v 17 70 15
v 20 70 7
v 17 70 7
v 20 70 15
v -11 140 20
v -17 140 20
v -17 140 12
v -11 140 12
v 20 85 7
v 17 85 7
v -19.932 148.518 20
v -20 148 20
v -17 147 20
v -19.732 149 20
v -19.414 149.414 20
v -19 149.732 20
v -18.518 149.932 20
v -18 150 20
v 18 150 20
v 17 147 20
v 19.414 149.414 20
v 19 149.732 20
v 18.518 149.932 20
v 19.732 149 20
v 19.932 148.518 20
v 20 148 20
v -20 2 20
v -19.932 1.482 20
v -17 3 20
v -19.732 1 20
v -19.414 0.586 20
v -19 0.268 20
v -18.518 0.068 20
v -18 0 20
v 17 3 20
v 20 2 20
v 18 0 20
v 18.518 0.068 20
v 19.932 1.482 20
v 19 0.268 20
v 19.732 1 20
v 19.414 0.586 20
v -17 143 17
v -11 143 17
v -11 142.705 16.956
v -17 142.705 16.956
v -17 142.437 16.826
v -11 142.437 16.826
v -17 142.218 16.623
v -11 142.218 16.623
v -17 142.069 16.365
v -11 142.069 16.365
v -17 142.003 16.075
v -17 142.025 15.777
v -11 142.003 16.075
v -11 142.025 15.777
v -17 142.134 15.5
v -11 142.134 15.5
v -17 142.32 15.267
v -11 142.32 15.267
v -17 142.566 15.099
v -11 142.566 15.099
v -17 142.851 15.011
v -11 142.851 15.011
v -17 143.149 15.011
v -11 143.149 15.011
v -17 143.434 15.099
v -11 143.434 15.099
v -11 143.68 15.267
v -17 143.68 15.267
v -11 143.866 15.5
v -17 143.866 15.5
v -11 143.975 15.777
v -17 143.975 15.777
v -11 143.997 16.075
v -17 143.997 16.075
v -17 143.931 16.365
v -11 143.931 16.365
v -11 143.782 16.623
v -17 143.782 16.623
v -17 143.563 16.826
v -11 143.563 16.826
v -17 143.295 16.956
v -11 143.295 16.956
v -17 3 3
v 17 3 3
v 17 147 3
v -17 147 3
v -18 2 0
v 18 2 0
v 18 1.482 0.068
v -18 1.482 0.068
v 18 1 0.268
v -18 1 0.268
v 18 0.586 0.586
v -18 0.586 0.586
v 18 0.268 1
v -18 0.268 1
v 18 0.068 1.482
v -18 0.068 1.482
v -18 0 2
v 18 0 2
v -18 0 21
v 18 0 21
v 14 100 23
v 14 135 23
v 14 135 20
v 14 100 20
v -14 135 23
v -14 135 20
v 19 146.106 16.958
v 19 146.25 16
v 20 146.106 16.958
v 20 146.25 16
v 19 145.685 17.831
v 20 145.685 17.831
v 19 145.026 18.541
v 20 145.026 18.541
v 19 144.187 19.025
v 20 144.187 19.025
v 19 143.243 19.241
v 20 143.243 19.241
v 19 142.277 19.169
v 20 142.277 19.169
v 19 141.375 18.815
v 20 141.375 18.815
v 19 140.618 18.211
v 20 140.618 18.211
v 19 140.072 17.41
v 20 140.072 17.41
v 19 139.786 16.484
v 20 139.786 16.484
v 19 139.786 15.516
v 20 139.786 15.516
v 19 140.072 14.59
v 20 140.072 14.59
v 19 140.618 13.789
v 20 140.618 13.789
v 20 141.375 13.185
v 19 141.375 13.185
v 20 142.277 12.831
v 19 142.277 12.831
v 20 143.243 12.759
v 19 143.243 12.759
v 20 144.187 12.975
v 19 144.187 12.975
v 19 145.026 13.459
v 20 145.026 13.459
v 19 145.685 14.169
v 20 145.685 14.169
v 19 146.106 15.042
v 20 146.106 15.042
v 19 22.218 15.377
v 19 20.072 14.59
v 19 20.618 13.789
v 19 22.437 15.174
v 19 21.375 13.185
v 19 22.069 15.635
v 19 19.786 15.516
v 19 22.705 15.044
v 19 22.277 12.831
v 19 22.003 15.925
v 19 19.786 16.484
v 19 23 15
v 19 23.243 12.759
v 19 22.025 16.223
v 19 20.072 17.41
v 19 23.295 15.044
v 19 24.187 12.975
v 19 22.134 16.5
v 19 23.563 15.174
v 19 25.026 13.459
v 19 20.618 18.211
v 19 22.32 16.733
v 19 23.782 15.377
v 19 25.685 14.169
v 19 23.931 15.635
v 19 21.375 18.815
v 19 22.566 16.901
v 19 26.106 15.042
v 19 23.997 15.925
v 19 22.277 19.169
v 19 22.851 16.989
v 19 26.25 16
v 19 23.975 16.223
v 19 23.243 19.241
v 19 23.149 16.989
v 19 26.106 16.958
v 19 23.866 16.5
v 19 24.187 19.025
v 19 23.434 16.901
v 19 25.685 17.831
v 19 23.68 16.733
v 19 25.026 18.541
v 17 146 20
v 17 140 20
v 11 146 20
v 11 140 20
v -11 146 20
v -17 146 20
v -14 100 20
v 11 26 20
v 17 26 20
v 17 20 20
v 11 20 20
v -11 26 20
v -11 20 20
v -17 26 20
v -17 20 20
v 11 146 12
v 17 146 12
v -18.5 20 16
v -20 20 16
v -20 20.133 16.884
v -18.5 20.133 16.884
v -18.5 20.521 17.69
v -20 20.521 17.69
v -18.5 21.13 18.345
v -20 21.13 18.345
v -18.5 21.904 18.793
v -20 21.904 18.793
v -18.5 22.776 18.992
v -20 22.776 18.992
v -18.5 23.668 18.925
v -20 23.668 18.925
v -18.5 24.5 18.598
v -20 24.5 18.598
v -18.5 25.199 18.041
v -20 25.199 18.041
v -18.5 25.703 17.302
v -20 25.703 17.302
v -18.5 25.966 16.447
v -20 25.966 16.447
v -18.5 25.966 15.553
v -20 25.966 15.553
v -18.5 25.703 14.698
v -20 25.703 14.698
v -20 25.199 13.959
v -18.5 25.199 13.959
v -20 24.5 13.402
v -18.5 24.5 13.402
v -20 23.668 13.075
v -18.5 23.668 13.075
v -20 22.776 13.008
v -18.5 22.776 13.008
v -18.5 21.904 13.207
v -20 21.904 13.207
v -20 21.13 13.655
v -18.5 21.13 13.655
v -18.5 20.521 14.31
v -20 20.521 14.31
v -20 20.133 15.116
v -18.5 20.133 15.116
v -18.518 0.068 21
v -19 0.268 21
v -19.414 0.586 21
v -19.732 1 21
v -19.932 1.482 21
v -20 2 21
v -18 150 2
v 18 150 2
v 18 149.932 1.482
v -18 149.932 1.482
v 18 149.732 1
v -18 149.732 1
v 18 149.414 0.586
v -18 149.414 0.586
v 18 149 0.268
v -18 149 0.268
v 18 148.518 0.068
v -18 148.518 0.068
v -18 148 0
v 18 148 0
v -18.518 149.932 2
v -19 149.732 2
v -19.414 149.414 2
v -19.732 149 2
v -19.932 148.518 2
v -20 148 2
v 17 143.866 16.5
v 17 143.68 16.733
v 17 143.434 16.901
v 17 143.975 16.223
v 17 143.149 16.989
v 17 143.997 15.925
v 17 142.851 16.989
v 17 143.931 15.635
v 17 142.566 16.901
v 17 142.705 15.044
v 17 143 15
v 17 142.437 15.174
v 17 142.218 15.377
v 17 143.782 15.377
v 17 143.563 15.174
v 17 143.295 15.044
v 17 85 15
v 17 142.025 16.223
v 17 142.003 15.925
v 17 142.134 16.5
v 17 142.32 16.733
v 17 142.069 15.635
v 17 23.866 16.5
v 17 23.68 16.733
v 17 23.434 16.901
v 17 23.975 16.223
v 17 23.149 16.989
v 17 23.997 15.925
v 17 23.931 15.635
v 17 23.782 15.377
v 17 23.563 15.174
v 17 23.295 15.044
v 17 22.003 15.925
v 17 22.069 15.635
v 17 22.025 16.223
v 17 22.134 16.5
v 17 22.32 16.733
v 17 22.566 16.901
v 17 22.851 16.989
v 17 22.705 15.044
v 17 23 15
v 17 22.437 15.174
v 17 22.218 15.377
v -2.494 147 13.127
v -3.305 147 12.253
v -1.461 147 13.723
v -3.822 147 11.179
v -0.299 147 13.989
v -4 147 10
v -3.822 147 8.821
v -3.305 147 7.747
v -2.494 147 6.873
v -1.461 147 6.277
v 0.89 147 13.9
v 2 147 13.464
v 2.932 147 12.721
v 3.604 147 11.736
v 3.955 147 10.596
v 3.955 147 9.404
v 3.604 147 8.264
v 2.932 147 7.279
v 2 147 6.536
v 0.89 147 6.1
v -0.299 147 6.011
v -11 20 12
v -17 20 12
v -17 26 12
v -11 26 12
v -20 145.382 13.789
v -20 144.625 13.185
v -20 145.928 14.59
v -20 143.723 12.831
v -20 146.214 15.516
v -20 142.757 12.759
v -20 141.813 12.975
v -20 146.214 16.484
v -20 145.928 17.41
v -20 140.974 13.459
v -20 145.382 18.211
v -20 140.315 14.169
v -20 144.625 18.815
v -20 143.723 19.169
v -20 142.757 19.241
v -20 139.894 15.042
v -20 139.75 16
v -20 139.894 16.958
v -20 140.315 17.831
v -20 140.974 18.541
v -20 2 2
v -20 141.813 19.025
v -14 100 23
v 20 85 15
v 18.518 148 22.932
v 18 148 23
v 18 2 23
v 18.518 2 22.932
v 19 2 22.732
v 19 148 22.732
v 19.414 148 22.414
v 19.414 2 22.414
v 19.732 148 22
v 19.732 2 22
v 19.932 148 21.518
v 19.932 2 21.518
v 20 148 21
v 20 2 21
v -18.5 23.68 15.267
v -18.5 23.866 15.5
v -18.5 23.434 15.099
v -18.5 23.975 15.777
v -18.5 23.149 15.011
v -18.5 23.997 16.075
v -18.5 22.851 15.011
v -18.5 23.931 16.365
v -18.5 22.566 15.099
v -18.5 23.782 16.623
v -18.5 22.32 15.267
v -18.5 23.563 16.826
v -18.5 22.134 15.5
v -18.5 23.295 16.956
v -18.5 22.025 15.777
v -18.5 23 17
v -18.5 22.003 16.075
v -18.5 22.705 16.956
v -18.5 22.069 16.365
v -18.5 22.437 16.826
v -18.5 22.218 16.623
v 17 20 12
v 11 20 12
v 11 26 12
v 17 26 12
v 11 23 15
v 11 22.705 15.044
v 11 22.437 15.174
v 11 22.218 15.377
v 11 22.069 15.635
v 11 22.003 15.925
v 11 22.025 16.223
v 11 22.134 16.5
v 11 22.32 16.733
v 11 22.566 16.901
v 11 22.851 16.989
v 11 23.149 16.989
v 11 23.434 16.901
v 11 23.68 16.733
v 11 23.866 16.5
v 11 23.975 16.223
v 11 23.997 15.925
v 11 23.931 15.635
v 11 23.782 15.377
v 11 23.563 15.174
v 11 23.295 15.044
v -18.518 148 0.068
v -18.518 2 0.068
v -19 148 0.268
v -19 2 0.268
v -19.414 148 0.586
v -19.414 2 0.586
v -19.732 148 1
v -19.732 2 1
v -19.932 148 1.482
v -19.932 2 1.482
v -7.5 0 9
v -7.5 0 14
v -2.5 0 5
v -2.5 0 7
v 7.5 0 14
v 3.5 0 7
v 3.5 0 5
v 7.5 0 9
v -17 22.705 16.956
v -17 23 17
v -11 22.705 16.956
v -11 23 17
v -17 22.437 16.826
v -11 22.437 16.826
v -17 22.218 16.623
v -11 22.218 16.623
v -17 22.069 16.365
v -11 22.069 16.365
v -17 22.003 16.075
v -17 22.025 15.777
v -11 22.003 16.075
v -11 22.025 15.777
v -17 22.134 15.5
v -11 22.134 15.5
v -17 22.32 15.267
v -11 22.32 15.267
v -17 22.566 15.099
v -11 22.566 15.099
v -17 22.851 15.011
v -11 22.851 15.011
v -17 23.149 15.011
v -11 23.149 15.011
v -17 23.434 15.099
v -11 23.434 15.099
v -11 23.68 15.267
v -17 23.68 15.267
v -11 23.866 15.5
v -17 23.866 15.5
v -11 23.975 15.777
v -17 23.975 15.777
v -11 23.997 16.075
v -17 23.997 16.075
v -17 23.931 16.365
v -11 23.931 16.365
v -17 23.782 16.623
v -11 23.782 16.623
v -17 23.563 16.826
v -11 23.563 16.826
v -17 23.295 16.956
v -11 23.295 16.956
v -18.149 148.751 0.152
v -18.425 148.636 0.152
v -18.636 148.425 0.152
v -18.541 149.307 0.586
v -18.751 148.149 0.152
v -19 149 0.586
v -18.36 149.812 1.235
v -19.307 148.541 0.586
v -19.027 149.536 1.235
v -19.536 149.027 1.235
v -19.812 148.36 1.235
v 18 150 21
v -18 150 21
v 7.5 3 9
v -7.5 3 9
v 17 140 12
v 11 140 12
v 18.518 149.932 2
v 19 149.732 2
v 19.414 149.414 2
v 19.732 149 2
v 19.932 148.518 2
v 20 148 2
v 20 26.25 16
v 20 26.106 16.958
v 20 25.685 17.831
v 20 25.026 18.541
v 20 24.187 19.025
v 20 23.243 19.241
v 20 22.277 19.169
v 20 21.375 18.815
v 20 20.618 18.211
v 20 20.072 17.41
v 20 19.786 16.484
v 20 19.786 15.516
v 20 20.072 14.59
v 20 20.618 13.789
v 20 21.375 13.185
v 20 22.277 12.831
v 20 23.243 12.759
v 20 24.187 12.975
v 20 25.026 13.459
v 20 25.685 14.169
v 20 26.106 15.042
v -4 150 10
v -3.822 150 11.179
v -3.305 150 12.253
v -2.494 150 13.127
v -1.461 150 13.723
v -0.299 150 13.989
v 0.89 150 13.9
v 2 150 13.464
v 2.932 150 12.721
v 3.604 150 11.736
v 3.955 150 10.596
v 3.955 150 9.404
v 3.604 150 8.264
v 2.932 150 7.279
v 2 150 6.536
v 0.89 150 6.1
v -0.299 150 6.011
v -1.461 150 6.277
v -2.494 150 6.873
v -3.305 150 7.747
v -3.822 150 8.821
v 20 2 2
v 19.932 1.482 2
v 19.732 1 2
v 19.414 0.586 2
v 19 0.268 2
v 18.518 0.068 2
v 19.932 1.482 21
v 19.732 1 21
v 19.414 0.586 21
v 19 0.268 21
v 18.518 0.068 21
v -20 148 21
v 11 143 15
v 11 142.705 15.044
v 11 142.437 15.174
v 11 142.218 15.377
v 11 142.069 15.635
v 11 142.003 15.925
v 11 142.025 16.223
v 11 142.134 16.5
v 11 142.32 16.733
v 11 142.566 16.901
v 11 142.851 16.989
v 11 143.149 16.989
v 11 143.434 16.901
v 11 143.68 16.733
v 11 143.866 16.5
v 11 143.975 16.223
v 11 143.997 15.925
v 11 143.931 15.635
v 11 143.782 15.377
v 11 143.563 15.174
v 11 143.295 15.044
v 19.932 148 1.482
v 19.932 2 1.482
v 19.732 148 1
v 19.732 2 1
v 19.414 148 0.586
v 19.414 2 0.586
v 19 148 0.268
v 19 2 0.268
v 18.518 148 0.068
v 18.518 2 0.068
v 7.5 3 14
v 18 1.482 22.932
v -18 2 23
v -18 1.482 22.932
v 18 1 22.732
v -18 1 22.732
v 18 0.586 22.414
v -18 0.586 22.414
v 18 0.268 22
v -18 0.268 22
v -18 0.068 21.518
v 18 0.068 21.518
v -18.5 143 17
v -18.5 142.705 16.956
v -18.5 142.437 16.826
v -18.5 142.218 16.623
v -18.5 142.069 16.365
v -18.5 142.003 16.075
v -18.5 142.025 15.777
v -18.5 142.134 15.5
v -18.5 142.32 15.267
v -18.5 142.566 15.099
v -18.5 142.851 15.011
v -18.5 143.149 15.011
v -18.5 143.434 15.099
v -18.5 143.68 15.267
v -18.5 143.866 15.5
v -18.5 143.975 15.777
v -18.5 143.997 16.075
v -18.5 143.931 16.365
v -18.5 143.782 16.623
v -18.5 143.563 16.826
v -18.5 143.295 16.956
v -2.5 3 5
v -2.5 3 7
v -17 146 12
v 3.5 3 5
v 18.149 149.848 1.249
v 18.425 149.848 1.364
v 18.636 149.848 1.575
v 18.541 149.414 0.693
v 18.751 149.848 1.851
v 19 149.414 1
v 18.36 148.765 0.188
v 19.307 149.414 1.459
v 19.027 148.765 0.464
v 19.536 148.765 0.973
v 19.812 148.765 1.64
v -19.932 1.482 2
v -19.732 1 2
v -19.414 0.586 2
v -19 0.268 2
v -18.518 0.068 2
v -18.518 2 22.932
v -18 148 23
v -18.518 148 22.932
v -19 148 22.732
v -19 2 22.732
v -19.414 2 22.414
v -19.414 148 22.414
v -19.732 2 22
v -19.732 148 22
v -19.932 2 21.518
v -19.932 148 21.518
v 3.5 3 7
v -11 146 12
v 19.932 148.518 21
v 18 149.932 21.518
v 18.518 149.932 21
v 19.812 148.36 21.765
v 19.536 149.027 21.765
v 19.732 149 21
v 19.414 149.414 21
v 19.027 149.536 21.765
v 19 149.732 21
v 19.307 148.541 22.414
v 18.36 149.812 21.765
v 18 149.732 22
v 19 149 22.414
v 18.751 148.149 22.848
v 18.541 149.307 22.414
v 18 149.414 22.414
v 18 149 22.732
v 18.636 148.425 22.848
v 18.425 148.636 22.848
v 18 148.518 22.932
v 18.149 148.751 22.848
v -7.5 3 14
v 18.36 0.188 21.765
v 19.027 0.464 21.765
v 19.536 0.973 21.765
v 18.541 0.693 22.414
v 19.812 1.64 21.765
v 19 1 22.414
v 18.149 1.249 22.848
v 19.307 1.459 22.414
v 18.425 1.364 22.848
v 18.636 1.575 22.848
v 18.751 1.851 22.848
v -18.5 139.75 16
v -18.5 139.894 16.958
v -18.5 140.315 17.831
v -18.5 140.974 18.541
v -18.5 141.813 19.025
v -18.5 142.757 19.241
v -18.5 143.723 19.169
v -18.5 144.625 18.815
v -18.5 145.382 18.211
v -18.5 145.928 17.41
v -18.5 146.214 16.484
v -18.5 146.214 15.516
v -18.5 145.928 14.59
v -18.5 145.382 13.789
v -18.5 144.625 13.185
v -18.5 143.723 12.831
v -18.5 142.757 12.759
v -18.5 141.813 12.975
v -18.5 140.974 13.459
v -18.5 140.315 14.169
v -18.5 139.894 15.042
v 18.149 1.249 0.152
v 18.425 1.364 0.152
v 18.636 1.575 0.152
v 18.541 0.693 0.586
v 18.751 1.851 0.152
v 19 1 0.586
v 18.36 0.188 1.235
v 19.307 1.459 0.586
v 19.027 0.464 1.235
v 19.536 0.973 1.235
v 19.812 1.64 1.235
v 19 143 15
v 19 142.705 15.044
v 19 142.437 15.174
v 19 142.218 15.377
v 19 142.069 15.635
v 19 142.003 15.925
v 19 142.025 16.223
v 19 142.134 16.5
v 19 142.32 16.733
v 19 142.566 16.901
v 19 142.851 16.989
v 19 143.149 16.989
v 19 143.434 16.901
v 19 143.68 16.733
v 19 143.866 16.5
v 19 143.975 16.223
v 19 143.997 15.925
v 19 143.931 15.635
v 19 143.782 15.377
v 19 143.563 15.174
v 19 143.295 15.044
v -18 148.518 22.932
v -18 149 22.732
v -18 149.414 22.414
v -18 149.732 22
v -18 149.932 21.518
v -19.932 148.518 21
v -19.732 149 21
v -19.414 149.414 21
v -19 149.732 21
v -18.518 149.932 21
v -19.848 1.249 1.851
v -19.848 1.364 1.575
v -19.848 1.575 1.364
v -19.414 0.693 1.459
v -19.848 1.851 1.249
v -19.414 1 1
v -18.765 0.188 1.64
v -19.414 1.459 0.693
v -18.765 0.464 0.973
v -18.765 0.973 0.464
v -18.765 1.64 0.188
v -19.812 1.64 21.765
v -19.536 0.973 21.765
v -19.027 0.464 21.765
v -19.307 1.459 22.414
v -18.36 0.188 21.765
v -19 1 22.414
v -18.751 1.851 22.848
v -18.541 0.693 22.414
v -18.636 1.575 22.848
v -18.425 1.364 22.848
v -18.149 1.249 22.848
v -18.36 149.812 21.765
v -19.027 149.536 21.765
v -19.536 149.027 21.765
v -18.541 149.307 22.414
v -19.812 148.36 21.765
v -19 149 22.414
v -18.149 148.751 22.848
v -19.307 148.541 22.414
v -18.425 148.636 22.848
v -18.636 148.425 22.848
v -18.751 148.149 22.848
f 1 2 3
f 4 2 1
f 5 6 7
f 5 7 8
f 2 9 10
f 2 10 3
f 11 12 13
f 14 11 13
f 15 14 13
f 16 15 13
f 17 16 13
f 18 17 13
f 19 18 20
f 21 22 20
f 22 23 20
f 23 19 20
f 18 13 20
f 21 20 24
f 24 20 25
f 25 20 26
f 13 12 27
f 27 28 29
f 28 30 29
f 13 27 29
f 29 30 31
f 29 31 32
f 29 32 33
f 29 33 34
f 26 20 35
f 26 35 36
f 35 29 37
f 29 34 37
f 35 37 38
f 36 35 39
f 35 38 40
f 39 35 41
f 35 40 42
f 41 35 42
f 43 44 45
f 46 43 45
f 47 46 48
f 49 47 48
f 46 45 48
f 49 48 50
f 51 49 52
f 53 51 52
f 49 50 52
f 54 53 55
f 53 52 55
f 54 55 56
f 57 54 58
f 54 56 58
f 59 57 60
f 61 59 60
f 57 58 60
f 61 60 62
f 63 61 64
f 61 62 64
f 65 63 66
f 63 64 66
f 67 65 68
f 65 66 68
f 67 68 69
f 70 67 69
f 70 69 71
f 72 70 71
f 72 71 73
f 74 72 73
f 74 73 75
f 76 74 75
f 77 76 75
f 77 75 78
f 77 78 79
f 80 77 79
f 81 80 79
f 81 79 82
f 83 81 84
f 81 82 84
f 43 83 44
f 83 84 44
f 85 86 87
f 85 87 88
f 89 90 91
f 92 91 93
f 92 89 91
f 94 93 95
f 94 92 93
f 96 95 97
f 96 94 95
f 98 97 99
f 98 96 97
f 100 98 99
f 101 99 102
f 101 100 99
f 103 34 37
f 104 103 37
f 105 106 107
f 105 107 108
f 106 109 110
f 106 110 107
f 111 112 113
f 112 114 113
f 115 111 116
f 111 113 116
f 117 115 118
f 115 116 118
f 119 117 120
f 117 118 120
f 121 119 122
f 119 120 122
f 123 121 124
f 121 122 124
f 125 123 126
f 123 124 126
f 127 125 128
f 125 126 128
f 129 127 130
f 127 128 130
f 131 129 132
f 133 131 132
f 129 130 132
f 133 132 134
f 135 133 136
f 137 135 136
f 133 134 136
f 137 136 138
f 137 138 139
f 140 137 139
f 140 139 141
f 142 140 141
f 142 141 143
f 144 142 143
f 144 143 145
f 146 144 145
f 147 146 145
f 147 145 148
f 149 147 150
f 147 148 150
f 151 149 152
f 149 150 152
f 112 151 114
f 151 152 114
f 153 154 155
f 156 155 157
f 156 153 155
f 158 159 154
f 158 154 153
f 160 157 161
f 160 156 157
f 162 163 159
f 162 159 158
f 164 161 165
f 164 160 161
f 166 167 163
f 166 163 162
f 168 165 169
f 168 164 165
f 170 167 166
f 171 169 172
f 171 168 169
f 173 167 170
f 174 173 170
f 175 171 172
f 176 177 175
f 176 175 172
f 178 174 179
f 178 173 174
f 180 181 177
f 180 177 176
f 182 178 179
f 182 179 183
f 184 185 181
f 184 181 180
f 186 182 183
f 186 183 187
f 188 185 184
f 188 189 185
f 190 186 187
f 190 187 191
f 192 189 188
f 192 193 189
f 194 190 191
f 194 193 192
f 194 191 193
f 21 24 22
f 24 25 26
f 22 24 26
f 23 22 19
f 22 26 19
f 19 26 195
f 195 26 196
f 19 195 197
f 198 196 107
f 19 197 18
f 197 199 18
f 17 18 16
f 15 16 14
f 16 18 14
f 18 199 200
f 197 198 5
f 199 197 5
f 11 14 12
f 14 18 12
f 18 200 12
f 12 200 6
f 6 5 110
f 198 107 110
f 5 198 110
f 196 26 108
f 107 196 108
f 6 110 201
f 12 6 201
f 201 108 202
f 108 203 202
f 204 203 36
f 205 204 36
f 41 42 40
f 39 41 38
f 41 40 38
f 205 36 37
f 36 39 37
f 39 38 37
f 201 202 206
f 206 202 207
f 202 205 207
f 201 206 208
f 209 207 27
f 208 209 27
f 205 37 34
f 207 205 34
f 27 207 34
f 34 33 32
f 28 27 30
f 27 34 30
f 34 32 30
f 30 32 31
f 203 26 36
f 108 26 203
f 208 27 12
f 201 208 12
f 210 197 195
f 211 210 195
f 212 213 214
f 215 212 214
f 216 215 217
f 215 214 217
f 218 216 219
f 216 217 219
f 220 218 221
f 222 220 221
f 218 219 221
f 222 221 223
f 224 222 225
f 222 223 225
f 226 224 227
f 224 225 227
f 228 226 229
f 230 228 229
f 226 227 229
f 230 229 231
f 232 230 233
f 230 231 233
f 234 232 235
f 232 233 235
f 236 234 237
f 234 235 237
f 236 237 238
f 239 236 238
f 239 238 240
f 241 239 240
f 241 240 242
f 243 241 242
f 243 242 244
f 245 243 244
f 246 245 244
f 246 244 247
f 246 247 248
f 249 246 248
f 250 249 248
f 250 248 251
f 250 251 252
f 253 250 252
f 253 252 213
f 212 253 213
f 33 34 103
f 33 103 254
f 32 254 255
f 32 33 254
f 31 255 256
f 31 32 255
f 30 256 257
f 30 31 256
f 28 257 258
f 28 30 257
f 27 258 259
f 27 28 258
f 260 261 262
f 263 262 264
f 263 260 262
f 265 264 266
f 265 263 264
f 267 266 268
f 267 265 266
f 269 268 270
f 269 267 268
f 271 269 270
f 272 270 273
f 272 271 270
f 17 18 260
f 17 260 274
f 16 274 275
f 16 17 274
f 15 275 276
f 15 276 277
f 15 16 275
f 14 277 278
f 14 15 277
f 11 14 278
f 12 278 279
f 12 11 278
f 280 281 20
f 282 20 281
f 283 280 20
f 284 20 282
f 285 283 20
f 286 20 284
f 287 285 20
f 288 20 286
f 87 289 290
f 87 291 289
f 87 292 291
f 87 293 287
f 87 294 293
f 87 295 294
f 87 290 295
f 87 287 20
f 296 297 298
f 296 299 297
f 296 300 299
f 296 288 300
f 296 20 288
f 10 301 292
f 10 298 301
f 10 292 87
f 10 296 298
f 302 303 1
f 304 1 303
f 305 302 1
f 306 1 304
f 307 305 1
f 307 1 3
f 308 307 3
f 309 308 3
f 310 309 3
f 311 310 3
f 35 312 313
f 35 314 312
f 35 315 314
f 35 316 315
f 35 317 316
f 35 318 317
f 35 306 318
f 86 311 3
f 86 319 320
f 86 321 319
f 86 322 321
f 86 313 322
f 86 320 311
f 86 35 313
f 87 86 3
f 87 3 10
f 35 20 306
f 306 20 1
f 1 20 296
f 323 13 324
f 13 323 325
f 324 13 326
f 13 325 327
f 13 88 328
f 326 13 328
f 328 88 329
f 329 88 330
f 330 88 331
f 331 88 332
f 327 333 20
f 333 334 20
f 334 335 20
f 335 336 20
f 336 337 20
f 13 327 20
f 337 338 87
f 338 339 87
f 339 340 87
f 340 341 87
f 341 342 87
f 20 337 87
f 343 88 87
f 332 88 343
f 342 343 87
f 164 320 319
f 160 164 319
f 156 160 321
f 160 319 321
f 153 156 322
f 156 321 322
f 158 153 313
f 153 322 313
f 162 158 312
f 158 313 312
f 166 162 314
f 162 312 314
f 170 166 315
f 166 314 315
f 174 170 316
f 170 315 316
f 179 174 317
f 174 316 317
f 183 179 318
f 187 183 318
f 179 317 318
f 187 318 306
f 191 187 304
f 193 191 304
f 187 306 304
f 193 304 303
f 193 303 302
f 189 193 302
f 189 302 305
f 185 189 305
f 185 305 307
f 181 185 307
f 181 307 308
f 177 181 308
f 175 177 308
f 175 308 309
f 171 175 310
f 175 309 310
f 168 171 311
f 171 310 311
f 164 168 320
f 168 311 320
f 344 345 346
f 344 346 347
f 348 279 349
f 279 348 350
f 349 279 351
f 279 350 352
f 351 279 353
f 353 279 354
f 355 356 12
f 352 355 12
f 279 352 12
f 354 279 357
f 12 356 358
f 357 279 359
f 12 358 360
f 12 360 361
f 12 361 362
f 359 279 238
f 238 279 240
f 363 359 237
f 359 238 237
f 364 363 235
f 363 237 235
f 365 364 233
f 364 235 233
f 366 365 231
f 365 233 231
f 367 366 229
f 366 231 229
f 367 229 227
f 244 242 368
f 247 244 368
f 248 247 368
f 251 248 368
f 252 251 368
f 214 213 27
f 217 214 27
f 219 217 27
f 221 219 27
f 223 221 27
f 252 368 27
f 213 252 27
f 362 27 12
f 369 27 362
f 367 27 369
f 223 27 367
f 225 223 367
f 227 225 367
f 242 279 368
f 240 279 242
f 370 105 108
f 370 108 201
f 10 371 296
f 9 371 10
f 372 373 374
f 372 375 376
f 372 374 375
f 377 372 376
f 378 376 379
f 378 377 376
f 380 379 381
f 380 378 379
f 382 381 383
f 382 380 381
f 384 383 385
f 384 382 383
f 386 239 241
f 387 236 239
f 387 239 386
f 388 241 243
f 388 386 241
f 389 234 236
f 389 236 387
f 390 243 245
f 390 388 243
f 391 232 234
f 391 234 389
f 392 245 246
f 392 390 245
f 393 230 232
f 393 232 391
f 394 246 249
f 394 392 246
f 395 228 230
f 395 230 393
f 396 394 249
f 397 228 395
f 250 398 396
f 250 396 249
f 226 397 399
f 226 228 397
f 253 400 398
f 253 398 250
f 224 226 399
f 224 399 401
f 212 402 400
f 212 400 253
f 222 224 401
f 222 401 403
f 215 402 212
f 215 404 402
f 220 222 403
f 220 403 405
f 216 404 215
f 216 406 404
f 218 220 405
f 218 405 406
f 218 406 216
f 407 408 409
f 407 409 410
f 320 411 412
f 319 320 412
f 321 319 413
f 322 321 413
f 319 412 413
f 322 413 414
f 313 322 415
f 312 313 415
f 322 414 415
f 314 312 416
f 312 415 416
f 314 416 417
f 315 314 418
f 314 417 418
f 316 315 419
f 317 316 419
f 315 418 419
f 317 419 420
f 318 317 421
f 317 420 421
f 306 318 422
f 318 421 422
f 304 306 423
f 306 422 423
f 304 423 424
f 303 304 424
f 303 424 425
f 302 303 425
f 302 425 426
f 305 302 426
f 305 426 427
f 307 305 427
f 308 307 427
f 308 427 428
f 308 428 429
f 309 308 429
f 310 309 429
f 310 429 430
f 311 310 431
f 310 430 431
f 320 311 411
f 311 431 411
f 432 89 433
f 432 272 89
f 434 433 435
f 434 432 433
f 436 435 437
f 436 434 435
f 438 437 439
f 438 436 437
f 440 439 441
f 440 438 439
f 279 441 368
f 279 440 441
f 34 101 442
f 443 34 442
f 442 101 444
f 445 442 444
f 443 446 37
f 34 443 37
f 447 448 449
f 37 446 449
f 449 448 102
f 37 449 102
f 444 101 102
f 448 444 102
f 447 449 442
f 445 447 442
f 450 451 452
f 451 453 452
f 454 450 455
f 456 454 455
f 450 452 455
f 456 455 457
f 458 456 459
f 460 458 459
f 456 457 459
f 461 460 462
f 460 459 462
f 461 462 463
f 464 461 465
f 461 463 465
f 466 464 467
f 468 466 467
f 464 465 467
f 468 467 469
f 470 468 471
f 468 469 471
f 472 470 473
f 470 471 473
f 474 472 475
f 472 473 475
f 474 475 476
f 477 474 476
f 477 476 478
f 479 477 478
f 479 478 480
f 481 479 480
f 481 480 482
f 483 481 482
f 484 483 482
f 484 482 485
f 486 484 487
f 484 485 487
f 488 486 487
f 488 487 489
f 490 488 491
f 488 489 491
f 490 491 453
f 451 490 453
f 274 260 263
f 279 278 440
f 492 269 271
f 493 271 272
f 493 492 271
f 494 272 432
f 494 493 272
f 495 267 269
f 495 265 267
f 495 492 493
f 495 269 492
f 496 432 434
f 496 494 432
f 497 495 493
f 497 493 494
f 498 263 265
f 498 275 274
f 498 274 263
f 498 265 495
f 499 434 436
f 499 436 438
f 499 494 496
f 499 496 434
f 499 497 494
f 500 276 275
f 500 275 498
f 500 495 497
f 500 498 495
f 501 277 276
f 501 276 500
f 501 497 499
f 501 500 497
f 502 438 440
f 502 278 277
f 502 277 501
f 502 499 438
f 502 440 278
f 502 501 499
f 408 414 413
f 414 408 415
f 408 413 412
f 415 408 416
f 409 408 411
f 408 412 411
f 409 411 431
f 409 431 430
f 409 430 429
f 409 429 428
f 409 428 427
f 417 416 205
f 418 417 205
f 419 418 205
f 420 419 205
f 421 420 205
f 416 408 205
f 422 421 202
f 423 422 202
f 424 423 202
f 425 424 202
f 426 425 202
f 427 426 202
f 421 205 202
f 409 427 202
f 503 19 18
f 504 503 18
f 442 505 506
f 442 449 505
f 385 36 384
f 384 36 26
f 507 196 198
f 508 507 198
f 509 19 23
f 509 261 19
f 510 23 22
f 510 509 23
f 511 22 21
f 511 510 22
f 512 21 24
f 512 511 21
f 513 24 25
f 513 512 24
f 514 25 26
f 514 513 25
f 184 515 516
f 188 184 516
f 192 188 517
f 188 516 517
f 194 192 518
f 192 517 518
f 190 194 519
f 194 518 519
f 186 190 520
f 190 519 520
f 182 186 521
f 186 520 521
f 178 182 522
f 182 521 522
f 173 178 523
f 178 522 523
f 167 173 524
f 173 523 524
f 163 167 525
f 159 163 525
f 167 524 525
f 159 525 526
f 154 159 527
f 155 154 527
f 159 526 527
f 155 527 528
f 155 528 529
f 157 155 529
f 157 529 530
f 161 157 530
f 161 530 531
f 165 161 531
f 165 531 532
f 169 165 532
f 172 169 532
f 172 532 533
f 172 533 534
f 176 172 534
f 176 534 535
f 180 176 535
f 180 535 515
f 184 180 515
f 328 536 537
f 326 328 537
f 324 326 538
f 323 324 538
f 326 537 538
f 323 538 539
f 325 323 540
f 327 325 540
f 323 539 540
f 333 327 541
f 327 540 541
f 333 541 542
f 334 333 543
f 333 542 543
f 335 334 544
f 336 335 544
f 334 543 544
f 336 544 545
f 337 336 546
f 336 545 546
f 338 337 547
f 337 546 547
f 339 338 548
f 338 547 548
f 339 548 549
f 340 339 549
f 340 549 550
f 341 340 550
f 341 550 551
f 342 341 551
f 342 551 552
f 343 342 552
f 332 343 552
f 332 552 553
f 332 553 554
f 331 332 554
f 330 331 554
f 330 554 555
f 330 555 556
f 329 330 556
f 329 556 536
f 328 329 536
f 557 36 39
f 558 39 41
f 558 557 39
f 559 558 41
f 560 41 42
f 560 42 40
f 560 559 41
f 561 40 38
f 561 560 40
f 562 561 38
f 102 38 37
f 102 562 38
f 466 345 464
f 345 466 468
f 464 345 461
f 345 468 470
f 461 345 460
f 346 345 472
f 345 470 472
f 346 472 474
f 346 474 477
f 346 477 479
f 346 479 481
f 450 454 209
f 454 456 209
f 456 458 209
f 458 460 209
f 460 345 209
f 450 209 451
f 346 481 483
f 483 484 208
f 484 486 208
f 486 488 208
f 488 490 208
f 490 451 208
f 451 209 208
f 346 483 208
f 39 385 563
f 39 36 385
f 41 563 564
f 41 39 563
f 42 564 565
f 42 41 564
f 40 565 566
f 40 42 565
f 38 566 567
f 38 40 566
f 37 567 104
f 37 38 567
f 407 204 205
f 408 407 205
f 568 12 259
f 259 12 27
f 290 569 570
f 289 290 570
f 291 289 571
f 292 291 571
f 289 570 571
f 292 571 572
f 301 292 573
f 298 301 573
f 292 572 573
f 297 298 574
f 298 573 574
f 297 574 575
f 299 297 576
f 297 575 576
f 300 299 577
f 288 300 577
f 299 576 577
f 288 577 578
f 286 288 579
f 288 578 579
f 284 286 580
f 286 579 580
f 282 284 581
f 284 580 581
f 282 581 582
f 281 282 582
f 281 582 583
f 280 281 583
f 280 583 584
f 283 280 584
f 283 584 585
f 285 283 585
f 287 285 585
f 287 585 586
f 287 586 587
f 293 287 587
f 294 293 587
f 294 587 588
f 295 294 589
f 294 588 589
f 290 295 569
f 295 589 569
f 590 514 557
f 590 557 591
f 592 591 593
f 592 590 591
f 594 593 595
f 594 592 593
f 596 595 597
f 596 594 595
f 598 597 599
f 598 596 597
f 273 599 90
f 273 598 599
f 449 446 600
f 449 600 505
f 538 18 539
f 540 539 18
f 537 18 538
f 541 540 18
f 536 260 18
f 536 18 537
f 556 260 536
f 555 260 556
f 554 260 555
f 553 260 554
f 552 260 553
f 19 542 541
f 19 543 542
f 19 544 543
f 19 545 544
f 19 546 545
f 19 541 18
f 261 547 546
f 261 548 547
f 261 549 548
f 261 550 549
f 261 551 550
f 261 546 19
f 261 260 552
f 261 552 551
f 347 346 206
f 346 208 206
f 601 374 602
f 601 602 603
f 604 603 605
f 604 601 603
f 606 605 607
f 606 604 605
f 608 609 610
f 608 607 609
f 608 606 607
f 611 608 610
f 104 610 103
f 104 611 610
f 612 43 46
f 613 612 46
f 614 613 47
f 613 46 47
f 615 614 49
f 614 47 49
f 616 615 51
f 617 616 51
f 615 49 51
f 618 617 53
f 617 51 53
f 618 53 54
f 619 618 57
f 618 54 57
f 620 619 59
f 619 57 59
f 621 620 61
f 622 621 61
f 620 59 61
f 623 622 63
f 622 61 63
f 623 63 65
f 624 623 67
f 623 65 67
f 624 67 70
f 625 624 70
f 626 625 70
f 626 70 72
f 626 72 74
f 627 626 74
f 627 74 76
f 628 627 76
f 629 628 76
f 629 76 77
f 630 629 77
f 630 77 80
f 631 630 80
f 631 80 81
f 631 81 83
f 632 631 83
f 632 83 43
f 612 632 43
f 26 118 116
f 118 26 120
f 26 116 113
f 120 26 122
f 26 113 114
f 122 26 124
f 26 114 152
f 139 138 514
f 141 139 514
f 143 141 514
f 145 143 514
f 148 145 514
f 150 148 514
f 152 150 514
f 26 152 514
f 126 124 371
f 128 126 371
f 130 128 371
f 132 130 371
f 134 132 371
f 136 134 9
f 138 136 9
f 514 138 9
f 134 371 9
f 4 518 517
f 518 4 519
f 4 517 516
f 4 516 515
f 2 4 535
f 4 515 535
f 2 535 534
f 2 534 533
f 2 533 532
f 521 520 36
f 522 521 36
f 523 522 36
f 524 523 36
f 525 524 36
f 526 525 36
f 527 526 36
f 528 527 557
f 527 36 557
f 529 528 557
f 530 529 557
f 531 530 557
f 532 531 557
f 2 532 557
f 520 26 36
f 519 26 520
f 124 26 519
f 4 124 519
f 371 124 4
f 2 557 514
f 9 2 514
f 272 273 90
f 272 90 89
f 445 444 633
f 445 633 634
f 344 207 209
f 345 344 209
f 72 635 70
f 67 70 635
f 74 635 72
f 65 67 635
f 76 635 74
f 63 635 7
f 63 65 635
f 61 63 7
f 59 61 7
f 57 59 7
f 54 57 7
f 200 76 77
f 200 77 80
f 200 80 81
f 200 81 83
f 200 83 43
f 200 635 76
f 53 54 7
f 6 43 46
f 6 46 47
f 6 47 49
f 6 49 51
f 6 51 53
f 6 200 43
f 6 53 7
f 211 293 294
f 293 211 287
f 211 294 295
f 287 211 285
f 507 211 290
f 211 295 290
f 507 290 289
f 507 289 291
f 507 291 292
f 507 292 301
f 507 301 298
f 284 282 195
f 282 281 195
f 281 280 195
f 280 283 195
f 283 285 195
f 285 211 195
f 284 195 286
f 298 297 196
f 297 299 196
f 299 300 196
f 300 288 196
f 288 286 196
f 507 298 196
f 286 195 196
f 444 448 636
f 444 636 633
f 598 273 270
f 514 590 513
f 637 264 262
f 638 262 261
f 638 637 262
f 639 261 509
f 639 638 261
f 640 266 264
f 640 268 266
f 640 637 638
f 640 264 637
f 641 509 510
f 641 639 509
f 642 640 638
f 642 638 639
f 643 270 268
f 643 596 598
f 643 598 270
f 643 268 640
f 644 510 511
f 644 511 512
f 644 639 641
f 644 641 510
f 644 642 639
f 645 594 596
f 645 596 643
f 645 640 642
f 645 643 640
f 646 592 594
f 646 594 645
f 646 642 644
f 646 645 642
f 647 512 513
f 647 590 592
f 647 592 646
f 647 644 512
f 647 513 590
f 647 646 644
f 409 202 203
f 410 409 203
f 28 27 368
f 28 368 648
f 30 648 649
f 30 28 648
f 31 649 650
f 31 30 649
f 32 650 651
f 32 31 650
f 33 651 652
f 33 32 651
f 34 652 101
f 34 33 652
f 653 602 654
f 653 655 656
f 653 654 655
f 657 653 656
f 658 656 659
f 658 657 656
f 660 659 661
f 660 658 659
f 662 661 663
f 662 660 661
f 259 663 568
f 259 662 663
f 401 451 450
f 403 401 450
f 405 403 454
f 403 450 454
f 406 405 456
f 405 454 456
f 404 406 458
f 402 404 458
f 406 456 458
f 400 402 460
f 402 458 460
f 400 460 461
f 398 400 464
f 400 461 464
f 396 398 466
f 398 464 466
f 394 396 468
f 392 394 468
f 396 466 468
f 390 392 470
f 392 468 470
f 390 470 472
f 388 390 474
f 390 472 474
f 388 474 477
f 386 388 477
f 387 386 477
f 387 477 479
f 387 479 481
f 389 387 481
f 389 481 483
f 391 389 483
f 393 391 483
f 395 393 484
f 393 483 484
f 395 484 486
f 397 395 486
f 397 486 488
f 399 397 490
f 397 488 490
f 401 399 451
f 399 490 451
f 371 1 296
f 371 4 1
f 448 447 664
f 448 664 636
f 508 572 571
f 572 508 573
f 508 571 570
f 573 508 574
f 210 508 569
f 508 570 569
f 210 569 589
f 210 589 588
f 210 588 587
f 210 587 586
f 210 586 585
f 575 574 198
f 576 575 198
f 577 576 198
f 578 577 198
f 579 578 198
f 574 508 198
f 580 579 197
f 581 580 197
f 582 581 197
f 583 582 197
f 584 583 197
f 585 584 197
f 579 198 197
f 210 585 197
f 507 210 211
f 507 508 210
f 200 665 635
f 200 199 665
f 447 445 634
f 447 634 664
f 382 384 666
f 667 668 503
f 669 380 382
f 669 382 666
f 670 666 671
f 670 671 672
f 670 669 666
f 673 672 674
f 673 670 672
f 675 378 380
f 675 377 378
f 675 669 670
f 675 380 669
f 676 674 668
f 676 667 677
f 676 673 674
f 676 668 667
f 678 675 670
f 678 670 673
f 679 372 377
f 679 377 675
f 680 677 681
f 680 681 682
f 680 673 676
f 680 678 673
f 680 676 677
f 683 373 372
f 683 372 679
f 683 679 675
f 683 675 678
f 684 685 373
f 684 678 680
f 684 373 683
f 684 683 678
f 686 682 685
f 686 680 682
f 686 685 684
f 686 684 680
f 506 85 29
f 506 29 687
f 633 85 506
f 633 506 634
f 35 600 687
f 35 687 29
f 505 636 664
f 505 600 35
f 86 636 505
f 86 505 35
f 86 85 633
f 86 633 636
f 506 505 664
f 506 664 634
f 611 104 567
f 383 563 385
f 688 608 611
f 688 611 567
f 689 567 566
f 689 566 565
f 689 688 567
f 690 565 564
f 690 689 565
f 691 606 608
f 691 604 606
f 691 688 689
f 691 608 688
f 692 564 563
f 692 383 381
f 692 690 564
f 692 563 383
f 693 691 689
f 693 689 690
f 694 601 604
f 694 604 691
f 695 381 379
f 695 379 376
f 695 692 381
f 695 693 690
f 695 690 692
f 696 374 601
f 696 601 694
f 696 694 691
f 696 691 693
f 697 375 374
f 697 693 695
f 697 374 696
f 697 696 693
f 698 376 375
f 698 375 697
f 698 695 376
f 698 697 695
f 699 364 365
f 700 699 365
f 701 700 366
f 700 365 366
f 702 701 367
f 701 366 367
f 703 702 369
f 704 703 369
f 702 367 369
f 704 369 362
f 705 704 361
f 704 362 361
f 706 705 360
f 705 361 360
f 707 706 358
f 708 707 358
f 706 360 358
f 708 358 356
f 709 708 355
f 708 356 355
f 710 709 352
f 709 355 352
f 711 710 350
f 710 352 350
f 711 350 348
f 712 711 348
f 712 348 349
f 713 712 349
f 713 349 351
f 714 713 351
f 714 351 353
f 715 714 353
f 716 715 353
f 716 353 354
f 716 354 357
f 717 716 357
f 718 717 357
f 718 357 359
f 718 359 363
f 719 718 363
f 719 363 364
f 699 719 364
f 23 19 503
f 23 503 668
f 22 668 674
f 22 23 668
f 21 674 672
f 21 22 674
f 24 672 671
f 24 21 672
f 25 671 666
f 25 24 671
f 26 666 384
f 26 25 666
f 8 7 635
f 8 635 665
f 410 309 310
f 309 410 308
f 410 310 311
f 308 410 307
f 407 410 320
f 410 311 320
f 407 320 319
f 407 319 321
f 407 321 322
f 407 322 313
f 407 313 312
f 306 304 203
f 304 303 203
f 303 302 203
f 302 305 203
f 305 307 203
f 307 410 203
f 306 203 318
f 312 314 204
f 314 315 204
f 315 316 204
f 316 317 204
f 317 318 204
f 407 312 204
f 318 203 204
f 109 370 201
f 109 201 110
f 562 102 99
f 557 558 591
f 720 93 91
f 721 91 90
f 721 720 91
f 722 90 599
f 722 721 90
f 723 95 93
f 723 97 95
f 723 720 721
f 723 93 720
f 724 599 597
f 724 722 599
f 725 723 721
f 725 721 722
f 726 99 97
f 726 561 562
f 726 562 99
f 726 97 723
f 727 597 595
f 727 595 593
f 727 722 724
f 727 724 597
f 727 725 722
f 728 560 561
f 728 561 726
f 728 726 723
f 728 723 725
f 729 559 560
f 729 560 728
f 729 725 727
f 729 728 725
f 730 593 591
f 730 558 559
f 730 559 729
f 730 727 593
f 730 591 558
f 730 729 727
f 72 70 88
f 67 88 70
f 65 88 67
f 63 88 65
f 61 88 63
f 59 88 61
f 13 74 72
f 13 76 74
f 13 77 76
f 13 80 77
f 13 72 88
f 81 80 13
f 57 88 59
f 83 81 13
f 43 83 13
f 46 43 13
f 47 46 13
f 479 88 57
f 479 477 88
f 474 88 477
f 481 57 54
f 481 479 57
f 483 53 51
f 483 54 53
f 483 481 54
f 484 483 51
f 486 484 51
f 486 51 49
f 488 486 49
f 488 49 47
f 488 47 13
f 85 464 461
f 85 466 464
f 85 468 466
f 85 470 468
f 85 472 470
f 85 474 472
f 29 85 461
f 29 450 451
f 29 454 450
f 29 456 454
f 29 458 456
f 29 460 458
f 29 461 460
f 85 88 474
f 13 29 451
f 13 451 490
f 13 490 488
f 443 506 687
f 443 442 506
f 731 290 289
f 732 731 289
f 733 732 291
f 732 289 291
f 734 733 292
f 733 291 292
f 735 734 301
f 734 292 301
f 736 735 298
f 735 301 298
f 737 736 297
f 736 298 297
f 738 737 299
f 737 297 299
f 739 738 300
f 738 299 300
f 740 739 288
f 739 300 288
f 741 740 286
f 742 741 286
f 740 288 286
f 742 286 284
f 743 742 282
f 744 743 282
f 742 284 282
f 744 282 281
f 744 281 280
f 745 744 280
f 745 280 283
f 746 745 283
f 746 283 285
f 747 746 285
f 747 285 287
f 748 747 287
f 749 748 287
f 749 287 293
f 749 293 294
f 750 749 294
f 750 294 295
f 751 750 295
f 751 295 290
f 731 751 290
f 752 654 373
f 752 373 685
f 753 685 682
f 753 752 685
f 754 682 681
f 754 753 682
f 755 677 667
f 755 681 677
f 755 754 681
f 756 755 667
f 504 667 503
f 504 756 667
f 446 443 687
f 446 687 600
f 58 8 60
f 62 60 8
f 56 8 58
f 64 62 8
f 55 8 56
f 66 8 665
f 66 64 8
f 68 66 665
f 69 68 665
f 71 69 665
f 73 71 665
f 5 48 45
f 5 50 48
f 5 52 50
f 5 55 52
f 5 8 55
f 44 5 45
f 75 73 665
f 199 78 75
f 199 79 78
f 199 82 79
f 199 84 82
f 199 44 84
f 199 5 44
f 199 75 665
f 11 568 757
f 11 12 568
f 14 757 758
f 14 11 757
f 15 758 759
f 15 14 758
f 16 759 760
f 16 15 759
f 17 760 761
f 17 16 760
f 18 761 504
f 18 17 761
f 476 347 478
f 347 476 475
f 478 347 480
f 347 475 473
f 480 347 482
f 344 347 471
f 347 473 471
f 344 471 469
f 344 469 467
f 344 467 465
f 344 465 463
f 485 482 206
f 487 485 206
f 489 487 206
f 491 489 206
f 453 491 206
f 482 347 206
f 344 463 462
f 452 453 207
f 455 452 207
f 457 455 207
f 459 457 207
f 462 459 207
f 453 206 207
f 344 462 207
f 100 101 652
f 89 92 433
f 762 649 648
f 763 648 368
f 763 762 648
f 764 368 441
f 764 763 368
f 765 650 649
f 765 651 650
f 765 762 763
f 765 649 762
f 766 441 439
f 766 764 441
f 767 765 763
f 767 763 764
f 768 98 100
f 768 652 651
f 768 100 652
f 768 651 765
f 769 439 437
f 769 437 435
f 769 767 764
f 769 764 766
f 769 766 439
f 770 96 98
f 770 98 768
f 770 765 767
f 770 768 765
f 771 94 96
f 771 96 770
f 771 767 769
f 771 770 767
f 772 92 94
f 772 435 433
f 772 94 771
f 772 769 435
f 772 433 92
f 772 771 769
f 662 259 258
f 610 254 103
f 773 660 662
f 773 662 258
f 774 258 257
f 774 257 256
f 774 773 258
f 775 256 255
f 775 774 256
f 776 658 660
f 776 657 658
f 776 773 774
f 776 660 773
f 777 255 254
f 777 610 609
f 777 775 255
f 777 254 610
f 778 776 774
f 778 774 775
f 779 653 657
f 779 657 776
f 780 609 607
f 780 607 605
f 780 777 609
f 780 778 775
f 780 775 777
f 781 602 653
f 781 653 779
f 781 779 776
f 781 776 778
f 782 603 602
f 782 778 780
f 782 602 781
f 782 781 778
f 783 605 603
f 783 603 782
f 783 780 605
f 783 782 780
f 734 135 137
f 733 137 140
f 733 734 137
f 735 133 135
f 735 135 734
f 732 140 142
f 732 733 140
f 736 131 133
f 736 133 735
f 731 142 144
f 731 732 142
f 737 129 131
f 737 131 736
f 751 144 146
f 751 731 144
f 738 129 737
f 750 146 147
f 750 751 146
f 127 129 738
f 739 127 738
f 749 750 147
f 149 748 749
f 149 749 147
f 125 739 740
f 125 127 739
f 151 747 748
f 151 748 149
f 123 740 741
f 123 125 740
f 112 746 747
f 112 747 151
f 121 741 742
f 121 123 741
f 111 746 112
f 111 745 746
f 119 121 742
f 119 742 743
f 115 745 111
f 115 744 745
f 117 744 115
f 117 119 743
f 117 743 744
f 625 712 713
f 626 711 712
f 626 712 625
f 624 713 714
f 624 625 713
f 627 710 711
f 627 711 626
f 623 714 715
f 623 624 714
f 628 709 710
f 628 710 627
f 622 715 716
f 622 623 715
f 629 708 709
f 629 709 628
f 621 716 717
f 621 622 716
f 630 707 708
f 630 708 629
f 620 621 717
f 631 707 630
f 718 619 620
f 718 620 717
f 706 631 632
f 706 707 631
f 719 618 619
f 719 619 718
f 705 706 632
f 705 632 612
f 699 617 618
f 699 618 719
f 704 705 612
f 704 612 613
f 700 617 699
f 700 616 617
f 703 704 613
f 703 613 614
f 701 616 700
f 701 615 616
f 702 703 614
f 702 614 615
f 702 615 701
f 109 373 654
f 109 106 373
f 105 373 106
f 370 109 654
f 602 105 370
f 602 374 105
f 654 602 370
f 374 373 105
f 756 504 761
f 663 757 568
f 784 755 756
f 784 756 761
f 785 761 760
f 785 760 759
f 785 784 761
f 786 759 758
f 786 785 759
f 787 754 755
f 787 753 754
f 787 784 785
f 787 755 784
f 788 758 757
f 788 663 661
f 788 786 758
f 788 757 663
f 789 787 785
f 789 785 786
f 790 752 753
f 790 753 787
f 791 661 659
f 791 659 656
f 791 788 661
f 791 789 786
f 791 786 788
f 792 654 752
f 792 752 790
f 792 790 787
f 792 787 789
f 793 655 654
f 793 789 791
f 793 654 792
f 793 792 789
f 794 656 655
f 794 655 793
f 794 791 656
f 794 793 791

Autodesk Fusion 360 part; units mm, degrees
sketch "Sketch1" plane through (0, 0, 0) normal (0, 1, 0) x (1, 0, 0) in component "Case"
  line L0 (-20, -20) -> (20, -20)
  line L1 (20, -20) -> (20, 0)
  line L2 (20, 0) -> (-20, 0)
  line L3 (-20, 0) -> (-20, -20)
  dimension "d1" = 40
  dimension "d2" = 20
  dimension "d3" = 20
  dimension "d4" = 20
extrude "Extrude1" add sketch "Sketch1" along normal blind 150 makes body 1 in component "Case"
fillet "Fillet1" radius 2 8 edges at (20, 0, 10) (20, 75, 0) (0, 0, 0) (-20, 0, 10) (-20, 150, 10) (0, 150, 0) (-20, 75, 0) (20, 150, 10) on bodies 1 in component "Case"
shell "Shell1" thickness 3 removed faces 1 at (-6.6667, 50.6667, 20) on bodies 1 in component "Case"
sketch "Sketch1 (2)" plane through (0, 0, 20) normal (0, 0, 1) x (-1, 0, 0) in component "Front"
  line L0 (-17, -147) -> (-17, -3)
  line L1 (-17, -3) -> (17, -3)
  line L2 (17, -3) -> (17, -147)
  line L3 (17, -147) -> (-17, -147)
  arc A0 (-18, 0) -> (-20, -2) centre (-18, -2) ccw
  line L4 (-20, -2) -> (-20, -148)
  arc A1 (-20, -148) -> (-18, -150) centre (-18, -148) ccw
  line L5 (-18, -150) -> (18, -150)
  arc A2 (18, -150) -> (20, -148) centre (18, -148) ccw
  line L6 (20, -148) -> (20, -2)
  arc A3 (20, -2) -> (18, 0) centre (18, -2) ccw
  line L7 (18, 0) -> (-18, 0)
  line L8 (17, -3) -> (-17, -3)
  line L9 (-17, -3) -> (-17, -147)
  line L10 (-17, -147) -> (17, -147)
  line L11 (17, -147) -> (17, -3)
extrude "Extrude1'" add sketch "Sketch1 (2)" along normal blind 3 separate body contours L0 L1 L2 L3 L8 L9 L10 L11 | A0 L4 A1 L5 A2 L6 A3 L7 makes body 2 in component "Front"
sketch "Sketch2" plane through (0, 0, 20) normal (0, 0, -1) x (1, 0, 0) in component "Front"
  line L0 (18, 0) -> (-18, 0)
  arc A0 (-18, 0) -> (-20, -2) centre (-18, -2) ccw
  line L1 (-20, -2) -> (-20, -148)
  arc A1 (-20, -148) -> (-18, -150) centre (-18, -148) ccw
  line L2 (-18, -150) -> (18, -150)
  arc A2 (18, -150) -> (20, -148) centre (18, -148) ccw
  line L3 (20, -148) -> (20, -2)
  arc A3 (20, -2) -> (18, 0) centre (18, -2) ccw
  line L4 (-17, -140) -> (-11, -140)
  line L5 (-11, -140) -> (-11, -146)
  line L6 (-11, -146) -> (-17, -146)
  line L7 (-17, -146) -> (-17, -140)
  line L8 (17, -140) -> (11, -140)
  line L9 (11, -140) -> (11, -146)
  line L10 (11, -146) -> (17, -146)
  line L11 (17, -146) -> (17, -140)
  line L12 (17, -20) -> (11, -20)
  line L13 (11, -20) -> (11, -26)
  line L14 (11, -26) -> (17, -26)
  line L15 (17, -26) -> (17, -20)
  line L16 (-11, -20) -> (-17, -20)
  line L17 (-17, -20) -> (-17, -26)
  line L18 (-17, -26) -> (-11, -26)
  line L19 (-11, -26) -> (-11, -20)
  dimension "d11" = 6
  dimension "d12" = 6
  dimension "d13" = 4
  dimension "d14" = 3
  dimension "d15" = 6
  dimension "d16" = 6
  dimension "d17" = 3
  dimension "d18" = 4
  dimension "d19" = 6
  dimension "d20" = 6
  dimension "d21" = 3
  dimension "d22" = 20
  dimension "d23" = 6
  dimension "d24" = 6
  dimension "d25" = 20
  dimension "d26" = 3
extrude "Extrude2" add sketch "Sketch2" along normal blind 8 contours L4 L5 L6 L7 | L8 L9 L10 L11 | L12 L13 L14 L15 | L16 L17 L18 L19 bodies 2 in component "Front"
hole "Hole1" at (-17, 143, 16) direction (1, 0, 0) diameter 2 depth 6 tip angle 118 bodies 2 in component "Front"
hole "Hole2" at (17, 143, 16) direction (-1, 0, 0) diameter 2 depth 6 tip angle 118 bodies 2 in component "Front"
hole "Hole3" at (17, 23, 16) direction (-1, 0, 0) diameter 2 depth 6 tip angle 118 bodies 2 in component "Front"
hole "Hole4" at (-17, 23, 16) direction (1, 0, 0) diameter 2 depth 6 tip angle 118 bodies 2 in component "Front"
sketch "Sketch3" plane through (0, 0, 23) normal (0, 0, 1) x (-1, 0, 0) in component "Front"
  line L0 (18, 0) -> (-18, 0)
  arc A0 (-18, 0) -> (-20, -2) centre (-18, -2) ccw
  line L1 (-20, -2) -> (-20, -148)
  arc A1 (-20, -148) -> (-18, -150) centre (-18, -148) ccw
  line L2 (-18, -150) -> (18, -150)
  arc A2 (18, -150) -> (20, -148) centre (18, -148) ccw
  line L3 (20, -148) -> (20, -2)
  arc A3 (20, -2) -> (18, 0) centre (18, -2) ccw
  line L4 (14, -135) -> (-14, -135)
  line L5 (-14, -135) -> (-14, -100)
  line L6 (-14, -100) -> (14, -100)
  line L7 (14, -100) -> (14, -135)
  dimension "d41" = 28
  dimension "d42" = 35
  dimension "d43" = 6
  dimension "d44" = 15
extrude "Extrude3" cut sketch "Sketch3" against normal blind 4 contours L4 L5 L6 L7 bodies 2 in component "Front"
sketch "Sketch2 (2)" plane through (20, 0, 0) normal (1, 0, 0) x (0, 1, 0) in component "Case"
  line L0 (2, 20) -> (2, 2)
  line L1 (2, 2) -> (148, 2)
  line L2 (148, 2) -> (148, 20)
  line L3 (148, 20) -> (2, 20)
  circle A0 centre (23, 16) radius 3.25
  circle A1 centre (143, 16) radius 3.25
  line L4 (70, 15) -> (85, 15)
  line L5 (85, 15) -> (85, 7)
  line L6 (85, 7) -> (70, 7)
  line L7 (70, 7) -> (70, 15)
  line L8 (0, 20) -> (0, 2)
  point P0 (0, 20)
  point P1 (150, 20)
  dimension "d47" = 6.5
  dimension "d48" = 4
  dimension "d49" = 23
  dimension "d50" = 6.5
  dimension "d51" = 4
  dimension "d52" = 7
  dimension "d53" = 8
  dimension "d85" = 70
hole "Hole2'" at (20, 143, 16) direction (-1, 0, 0) diameter 2 depth 6 tip angle 118 bodies 1 in component "Case"
hole "Hole1'" at (20, 23, 16) direction (-1, 0, 0) diameter 2 depth 6 tip angle 118 bodies 1 in component "Case"
extrude "Extrude2'" cut sketch "Sketch2 (2)" against normal blind 1 contours A0 | A1 bodies 1 in component "Case"
extrude "Extrude5" cut sketch "Sketch2 (2)" against normal blind 4 contours L4 L5 L6 L7 bodies 1 in component "Case"
sketch "Sketch3 (2)" plane through (-20, 0, 0) normal (-1, 0, 0) x (0, -1, 0) in component "Case"
  line L0 (-2, 2) -> (-2, 20)
  line L1 (-2, 20) -> (-148, 20)
  line L2 (-148, 20) -> (-148, 2)
  line L3 (-148, 2) -> (-2, 2)
  circle A0 centre (-143, 16) radius 3.25
  circle A1 centre (-23, 16) radius 3
  point P0 (-150, 20)
  point P1 (0, 20)
  dimension "d65" = 6.5
  dimension "d66" = 7
  dimension "d67" = 4
  dimension "d68" = 6
  dimension "d69" = 23
  dimension "d70" = 4
hole "Hole4'" at (-20, 143, 16) direction (1, 0, 0) diameter 2 depth 6 tip angle 118 bodies 1 in component "Case"
hole "Hole3'" at (-20, 23, 16) direction (1, 0, 0) diameter 2 depth 6 tip angle 118 bodies 1 in component "Case"
extrude "Extrude3'" cut sketch "Sketch3 (2)" against normal blind 1.5 contours A0 | A1 bodies 1 in component "Case"
sketch "Sketch4" plane through (0, 150, 0) normal (0, 1, 0) x (-1, 0, 0) in component "Case"
  line L0 (-18, 20) -> (-18, 2)
  line L1 (-18, 2) -> (18, 2)
  line L2 (18, 2) -> (18, 20)
  line L3 (18, 20) -> (-18, 20)
  circle A0 centre (0, 10) radius 4
  dimension "d79" = 8
  dimension "d80" = 10
extrude "Extrude4" cut sketch "Sketch4" against normal blind 4 contours A0 bodies 1 in component "Case"
fillet "Fillet1'" radius 2 8 edges at (0, 150, 23) (-19.4142, 149.4142, 23) (-20, 75, 23) (-19.4142, 0.5858, 23) (0, 0, 23) (19.4142, 0.5858, 23) (20, 75, 23) (19.4142, 149.4142, 23) on bodies 2 in component "Front"
sketch "Sketch5" plane through (0, 0, 0) normal (0, -1, 0) x (1, 0, 0) in component "Case"
  line L0 (18, 2) -> (18, 20)
  line L1 (18, 20) -> (-18, 20)
  line L2 (-18, 20) -> (-18, 2)
  line L3 (-18, 2) -> (18, 2)
  line L4 (-7.5, 14) -> (7.5, 14)
  line L5 (7.5, 14) -> (7.5, 9)
  line L6 (7.5, 9) -> (-7.5, 9)
  line L7 (-7.5, 9) -> (-7.5, 14)
  line L8 (-2.5, 7) -> (3.5, 7)
  line L9 (3.5, 7) -> (3.5, 5)
  line L10 (3.5, 5) -> (-2.5, 5)
  line L11 (-2.5, 5) -> (-2.5, 7)
  line L12 (-18, 0) -> (18, 0)
  point P0 (20, 2)
  point P1 (20, 7)
  dimension "d88" = 15
  dimension "d89" = 5
  dimension "d90" = 6
  dimension "d91" = 2
  dimension "d92" = 7
  dimension "d94" = 16.5
  dimension "d95" = 9
  dimension "d96" = 12.5
extrude "Extrude6" cut sketch "Sketch5" against normal blind 4 contours L4 L5 L6 L7 | L8 L9 L10 L11 bodies 1 in component "Case"
component "Case" placed x (1, 0, 0) y (0, 1, 0) z (0, 0, 1) at (0, 0, 0)
component "Front" placed x (1, 0, 0) y (0, 1, 0) z (0, 0, 1) at (0, 0, 0)
